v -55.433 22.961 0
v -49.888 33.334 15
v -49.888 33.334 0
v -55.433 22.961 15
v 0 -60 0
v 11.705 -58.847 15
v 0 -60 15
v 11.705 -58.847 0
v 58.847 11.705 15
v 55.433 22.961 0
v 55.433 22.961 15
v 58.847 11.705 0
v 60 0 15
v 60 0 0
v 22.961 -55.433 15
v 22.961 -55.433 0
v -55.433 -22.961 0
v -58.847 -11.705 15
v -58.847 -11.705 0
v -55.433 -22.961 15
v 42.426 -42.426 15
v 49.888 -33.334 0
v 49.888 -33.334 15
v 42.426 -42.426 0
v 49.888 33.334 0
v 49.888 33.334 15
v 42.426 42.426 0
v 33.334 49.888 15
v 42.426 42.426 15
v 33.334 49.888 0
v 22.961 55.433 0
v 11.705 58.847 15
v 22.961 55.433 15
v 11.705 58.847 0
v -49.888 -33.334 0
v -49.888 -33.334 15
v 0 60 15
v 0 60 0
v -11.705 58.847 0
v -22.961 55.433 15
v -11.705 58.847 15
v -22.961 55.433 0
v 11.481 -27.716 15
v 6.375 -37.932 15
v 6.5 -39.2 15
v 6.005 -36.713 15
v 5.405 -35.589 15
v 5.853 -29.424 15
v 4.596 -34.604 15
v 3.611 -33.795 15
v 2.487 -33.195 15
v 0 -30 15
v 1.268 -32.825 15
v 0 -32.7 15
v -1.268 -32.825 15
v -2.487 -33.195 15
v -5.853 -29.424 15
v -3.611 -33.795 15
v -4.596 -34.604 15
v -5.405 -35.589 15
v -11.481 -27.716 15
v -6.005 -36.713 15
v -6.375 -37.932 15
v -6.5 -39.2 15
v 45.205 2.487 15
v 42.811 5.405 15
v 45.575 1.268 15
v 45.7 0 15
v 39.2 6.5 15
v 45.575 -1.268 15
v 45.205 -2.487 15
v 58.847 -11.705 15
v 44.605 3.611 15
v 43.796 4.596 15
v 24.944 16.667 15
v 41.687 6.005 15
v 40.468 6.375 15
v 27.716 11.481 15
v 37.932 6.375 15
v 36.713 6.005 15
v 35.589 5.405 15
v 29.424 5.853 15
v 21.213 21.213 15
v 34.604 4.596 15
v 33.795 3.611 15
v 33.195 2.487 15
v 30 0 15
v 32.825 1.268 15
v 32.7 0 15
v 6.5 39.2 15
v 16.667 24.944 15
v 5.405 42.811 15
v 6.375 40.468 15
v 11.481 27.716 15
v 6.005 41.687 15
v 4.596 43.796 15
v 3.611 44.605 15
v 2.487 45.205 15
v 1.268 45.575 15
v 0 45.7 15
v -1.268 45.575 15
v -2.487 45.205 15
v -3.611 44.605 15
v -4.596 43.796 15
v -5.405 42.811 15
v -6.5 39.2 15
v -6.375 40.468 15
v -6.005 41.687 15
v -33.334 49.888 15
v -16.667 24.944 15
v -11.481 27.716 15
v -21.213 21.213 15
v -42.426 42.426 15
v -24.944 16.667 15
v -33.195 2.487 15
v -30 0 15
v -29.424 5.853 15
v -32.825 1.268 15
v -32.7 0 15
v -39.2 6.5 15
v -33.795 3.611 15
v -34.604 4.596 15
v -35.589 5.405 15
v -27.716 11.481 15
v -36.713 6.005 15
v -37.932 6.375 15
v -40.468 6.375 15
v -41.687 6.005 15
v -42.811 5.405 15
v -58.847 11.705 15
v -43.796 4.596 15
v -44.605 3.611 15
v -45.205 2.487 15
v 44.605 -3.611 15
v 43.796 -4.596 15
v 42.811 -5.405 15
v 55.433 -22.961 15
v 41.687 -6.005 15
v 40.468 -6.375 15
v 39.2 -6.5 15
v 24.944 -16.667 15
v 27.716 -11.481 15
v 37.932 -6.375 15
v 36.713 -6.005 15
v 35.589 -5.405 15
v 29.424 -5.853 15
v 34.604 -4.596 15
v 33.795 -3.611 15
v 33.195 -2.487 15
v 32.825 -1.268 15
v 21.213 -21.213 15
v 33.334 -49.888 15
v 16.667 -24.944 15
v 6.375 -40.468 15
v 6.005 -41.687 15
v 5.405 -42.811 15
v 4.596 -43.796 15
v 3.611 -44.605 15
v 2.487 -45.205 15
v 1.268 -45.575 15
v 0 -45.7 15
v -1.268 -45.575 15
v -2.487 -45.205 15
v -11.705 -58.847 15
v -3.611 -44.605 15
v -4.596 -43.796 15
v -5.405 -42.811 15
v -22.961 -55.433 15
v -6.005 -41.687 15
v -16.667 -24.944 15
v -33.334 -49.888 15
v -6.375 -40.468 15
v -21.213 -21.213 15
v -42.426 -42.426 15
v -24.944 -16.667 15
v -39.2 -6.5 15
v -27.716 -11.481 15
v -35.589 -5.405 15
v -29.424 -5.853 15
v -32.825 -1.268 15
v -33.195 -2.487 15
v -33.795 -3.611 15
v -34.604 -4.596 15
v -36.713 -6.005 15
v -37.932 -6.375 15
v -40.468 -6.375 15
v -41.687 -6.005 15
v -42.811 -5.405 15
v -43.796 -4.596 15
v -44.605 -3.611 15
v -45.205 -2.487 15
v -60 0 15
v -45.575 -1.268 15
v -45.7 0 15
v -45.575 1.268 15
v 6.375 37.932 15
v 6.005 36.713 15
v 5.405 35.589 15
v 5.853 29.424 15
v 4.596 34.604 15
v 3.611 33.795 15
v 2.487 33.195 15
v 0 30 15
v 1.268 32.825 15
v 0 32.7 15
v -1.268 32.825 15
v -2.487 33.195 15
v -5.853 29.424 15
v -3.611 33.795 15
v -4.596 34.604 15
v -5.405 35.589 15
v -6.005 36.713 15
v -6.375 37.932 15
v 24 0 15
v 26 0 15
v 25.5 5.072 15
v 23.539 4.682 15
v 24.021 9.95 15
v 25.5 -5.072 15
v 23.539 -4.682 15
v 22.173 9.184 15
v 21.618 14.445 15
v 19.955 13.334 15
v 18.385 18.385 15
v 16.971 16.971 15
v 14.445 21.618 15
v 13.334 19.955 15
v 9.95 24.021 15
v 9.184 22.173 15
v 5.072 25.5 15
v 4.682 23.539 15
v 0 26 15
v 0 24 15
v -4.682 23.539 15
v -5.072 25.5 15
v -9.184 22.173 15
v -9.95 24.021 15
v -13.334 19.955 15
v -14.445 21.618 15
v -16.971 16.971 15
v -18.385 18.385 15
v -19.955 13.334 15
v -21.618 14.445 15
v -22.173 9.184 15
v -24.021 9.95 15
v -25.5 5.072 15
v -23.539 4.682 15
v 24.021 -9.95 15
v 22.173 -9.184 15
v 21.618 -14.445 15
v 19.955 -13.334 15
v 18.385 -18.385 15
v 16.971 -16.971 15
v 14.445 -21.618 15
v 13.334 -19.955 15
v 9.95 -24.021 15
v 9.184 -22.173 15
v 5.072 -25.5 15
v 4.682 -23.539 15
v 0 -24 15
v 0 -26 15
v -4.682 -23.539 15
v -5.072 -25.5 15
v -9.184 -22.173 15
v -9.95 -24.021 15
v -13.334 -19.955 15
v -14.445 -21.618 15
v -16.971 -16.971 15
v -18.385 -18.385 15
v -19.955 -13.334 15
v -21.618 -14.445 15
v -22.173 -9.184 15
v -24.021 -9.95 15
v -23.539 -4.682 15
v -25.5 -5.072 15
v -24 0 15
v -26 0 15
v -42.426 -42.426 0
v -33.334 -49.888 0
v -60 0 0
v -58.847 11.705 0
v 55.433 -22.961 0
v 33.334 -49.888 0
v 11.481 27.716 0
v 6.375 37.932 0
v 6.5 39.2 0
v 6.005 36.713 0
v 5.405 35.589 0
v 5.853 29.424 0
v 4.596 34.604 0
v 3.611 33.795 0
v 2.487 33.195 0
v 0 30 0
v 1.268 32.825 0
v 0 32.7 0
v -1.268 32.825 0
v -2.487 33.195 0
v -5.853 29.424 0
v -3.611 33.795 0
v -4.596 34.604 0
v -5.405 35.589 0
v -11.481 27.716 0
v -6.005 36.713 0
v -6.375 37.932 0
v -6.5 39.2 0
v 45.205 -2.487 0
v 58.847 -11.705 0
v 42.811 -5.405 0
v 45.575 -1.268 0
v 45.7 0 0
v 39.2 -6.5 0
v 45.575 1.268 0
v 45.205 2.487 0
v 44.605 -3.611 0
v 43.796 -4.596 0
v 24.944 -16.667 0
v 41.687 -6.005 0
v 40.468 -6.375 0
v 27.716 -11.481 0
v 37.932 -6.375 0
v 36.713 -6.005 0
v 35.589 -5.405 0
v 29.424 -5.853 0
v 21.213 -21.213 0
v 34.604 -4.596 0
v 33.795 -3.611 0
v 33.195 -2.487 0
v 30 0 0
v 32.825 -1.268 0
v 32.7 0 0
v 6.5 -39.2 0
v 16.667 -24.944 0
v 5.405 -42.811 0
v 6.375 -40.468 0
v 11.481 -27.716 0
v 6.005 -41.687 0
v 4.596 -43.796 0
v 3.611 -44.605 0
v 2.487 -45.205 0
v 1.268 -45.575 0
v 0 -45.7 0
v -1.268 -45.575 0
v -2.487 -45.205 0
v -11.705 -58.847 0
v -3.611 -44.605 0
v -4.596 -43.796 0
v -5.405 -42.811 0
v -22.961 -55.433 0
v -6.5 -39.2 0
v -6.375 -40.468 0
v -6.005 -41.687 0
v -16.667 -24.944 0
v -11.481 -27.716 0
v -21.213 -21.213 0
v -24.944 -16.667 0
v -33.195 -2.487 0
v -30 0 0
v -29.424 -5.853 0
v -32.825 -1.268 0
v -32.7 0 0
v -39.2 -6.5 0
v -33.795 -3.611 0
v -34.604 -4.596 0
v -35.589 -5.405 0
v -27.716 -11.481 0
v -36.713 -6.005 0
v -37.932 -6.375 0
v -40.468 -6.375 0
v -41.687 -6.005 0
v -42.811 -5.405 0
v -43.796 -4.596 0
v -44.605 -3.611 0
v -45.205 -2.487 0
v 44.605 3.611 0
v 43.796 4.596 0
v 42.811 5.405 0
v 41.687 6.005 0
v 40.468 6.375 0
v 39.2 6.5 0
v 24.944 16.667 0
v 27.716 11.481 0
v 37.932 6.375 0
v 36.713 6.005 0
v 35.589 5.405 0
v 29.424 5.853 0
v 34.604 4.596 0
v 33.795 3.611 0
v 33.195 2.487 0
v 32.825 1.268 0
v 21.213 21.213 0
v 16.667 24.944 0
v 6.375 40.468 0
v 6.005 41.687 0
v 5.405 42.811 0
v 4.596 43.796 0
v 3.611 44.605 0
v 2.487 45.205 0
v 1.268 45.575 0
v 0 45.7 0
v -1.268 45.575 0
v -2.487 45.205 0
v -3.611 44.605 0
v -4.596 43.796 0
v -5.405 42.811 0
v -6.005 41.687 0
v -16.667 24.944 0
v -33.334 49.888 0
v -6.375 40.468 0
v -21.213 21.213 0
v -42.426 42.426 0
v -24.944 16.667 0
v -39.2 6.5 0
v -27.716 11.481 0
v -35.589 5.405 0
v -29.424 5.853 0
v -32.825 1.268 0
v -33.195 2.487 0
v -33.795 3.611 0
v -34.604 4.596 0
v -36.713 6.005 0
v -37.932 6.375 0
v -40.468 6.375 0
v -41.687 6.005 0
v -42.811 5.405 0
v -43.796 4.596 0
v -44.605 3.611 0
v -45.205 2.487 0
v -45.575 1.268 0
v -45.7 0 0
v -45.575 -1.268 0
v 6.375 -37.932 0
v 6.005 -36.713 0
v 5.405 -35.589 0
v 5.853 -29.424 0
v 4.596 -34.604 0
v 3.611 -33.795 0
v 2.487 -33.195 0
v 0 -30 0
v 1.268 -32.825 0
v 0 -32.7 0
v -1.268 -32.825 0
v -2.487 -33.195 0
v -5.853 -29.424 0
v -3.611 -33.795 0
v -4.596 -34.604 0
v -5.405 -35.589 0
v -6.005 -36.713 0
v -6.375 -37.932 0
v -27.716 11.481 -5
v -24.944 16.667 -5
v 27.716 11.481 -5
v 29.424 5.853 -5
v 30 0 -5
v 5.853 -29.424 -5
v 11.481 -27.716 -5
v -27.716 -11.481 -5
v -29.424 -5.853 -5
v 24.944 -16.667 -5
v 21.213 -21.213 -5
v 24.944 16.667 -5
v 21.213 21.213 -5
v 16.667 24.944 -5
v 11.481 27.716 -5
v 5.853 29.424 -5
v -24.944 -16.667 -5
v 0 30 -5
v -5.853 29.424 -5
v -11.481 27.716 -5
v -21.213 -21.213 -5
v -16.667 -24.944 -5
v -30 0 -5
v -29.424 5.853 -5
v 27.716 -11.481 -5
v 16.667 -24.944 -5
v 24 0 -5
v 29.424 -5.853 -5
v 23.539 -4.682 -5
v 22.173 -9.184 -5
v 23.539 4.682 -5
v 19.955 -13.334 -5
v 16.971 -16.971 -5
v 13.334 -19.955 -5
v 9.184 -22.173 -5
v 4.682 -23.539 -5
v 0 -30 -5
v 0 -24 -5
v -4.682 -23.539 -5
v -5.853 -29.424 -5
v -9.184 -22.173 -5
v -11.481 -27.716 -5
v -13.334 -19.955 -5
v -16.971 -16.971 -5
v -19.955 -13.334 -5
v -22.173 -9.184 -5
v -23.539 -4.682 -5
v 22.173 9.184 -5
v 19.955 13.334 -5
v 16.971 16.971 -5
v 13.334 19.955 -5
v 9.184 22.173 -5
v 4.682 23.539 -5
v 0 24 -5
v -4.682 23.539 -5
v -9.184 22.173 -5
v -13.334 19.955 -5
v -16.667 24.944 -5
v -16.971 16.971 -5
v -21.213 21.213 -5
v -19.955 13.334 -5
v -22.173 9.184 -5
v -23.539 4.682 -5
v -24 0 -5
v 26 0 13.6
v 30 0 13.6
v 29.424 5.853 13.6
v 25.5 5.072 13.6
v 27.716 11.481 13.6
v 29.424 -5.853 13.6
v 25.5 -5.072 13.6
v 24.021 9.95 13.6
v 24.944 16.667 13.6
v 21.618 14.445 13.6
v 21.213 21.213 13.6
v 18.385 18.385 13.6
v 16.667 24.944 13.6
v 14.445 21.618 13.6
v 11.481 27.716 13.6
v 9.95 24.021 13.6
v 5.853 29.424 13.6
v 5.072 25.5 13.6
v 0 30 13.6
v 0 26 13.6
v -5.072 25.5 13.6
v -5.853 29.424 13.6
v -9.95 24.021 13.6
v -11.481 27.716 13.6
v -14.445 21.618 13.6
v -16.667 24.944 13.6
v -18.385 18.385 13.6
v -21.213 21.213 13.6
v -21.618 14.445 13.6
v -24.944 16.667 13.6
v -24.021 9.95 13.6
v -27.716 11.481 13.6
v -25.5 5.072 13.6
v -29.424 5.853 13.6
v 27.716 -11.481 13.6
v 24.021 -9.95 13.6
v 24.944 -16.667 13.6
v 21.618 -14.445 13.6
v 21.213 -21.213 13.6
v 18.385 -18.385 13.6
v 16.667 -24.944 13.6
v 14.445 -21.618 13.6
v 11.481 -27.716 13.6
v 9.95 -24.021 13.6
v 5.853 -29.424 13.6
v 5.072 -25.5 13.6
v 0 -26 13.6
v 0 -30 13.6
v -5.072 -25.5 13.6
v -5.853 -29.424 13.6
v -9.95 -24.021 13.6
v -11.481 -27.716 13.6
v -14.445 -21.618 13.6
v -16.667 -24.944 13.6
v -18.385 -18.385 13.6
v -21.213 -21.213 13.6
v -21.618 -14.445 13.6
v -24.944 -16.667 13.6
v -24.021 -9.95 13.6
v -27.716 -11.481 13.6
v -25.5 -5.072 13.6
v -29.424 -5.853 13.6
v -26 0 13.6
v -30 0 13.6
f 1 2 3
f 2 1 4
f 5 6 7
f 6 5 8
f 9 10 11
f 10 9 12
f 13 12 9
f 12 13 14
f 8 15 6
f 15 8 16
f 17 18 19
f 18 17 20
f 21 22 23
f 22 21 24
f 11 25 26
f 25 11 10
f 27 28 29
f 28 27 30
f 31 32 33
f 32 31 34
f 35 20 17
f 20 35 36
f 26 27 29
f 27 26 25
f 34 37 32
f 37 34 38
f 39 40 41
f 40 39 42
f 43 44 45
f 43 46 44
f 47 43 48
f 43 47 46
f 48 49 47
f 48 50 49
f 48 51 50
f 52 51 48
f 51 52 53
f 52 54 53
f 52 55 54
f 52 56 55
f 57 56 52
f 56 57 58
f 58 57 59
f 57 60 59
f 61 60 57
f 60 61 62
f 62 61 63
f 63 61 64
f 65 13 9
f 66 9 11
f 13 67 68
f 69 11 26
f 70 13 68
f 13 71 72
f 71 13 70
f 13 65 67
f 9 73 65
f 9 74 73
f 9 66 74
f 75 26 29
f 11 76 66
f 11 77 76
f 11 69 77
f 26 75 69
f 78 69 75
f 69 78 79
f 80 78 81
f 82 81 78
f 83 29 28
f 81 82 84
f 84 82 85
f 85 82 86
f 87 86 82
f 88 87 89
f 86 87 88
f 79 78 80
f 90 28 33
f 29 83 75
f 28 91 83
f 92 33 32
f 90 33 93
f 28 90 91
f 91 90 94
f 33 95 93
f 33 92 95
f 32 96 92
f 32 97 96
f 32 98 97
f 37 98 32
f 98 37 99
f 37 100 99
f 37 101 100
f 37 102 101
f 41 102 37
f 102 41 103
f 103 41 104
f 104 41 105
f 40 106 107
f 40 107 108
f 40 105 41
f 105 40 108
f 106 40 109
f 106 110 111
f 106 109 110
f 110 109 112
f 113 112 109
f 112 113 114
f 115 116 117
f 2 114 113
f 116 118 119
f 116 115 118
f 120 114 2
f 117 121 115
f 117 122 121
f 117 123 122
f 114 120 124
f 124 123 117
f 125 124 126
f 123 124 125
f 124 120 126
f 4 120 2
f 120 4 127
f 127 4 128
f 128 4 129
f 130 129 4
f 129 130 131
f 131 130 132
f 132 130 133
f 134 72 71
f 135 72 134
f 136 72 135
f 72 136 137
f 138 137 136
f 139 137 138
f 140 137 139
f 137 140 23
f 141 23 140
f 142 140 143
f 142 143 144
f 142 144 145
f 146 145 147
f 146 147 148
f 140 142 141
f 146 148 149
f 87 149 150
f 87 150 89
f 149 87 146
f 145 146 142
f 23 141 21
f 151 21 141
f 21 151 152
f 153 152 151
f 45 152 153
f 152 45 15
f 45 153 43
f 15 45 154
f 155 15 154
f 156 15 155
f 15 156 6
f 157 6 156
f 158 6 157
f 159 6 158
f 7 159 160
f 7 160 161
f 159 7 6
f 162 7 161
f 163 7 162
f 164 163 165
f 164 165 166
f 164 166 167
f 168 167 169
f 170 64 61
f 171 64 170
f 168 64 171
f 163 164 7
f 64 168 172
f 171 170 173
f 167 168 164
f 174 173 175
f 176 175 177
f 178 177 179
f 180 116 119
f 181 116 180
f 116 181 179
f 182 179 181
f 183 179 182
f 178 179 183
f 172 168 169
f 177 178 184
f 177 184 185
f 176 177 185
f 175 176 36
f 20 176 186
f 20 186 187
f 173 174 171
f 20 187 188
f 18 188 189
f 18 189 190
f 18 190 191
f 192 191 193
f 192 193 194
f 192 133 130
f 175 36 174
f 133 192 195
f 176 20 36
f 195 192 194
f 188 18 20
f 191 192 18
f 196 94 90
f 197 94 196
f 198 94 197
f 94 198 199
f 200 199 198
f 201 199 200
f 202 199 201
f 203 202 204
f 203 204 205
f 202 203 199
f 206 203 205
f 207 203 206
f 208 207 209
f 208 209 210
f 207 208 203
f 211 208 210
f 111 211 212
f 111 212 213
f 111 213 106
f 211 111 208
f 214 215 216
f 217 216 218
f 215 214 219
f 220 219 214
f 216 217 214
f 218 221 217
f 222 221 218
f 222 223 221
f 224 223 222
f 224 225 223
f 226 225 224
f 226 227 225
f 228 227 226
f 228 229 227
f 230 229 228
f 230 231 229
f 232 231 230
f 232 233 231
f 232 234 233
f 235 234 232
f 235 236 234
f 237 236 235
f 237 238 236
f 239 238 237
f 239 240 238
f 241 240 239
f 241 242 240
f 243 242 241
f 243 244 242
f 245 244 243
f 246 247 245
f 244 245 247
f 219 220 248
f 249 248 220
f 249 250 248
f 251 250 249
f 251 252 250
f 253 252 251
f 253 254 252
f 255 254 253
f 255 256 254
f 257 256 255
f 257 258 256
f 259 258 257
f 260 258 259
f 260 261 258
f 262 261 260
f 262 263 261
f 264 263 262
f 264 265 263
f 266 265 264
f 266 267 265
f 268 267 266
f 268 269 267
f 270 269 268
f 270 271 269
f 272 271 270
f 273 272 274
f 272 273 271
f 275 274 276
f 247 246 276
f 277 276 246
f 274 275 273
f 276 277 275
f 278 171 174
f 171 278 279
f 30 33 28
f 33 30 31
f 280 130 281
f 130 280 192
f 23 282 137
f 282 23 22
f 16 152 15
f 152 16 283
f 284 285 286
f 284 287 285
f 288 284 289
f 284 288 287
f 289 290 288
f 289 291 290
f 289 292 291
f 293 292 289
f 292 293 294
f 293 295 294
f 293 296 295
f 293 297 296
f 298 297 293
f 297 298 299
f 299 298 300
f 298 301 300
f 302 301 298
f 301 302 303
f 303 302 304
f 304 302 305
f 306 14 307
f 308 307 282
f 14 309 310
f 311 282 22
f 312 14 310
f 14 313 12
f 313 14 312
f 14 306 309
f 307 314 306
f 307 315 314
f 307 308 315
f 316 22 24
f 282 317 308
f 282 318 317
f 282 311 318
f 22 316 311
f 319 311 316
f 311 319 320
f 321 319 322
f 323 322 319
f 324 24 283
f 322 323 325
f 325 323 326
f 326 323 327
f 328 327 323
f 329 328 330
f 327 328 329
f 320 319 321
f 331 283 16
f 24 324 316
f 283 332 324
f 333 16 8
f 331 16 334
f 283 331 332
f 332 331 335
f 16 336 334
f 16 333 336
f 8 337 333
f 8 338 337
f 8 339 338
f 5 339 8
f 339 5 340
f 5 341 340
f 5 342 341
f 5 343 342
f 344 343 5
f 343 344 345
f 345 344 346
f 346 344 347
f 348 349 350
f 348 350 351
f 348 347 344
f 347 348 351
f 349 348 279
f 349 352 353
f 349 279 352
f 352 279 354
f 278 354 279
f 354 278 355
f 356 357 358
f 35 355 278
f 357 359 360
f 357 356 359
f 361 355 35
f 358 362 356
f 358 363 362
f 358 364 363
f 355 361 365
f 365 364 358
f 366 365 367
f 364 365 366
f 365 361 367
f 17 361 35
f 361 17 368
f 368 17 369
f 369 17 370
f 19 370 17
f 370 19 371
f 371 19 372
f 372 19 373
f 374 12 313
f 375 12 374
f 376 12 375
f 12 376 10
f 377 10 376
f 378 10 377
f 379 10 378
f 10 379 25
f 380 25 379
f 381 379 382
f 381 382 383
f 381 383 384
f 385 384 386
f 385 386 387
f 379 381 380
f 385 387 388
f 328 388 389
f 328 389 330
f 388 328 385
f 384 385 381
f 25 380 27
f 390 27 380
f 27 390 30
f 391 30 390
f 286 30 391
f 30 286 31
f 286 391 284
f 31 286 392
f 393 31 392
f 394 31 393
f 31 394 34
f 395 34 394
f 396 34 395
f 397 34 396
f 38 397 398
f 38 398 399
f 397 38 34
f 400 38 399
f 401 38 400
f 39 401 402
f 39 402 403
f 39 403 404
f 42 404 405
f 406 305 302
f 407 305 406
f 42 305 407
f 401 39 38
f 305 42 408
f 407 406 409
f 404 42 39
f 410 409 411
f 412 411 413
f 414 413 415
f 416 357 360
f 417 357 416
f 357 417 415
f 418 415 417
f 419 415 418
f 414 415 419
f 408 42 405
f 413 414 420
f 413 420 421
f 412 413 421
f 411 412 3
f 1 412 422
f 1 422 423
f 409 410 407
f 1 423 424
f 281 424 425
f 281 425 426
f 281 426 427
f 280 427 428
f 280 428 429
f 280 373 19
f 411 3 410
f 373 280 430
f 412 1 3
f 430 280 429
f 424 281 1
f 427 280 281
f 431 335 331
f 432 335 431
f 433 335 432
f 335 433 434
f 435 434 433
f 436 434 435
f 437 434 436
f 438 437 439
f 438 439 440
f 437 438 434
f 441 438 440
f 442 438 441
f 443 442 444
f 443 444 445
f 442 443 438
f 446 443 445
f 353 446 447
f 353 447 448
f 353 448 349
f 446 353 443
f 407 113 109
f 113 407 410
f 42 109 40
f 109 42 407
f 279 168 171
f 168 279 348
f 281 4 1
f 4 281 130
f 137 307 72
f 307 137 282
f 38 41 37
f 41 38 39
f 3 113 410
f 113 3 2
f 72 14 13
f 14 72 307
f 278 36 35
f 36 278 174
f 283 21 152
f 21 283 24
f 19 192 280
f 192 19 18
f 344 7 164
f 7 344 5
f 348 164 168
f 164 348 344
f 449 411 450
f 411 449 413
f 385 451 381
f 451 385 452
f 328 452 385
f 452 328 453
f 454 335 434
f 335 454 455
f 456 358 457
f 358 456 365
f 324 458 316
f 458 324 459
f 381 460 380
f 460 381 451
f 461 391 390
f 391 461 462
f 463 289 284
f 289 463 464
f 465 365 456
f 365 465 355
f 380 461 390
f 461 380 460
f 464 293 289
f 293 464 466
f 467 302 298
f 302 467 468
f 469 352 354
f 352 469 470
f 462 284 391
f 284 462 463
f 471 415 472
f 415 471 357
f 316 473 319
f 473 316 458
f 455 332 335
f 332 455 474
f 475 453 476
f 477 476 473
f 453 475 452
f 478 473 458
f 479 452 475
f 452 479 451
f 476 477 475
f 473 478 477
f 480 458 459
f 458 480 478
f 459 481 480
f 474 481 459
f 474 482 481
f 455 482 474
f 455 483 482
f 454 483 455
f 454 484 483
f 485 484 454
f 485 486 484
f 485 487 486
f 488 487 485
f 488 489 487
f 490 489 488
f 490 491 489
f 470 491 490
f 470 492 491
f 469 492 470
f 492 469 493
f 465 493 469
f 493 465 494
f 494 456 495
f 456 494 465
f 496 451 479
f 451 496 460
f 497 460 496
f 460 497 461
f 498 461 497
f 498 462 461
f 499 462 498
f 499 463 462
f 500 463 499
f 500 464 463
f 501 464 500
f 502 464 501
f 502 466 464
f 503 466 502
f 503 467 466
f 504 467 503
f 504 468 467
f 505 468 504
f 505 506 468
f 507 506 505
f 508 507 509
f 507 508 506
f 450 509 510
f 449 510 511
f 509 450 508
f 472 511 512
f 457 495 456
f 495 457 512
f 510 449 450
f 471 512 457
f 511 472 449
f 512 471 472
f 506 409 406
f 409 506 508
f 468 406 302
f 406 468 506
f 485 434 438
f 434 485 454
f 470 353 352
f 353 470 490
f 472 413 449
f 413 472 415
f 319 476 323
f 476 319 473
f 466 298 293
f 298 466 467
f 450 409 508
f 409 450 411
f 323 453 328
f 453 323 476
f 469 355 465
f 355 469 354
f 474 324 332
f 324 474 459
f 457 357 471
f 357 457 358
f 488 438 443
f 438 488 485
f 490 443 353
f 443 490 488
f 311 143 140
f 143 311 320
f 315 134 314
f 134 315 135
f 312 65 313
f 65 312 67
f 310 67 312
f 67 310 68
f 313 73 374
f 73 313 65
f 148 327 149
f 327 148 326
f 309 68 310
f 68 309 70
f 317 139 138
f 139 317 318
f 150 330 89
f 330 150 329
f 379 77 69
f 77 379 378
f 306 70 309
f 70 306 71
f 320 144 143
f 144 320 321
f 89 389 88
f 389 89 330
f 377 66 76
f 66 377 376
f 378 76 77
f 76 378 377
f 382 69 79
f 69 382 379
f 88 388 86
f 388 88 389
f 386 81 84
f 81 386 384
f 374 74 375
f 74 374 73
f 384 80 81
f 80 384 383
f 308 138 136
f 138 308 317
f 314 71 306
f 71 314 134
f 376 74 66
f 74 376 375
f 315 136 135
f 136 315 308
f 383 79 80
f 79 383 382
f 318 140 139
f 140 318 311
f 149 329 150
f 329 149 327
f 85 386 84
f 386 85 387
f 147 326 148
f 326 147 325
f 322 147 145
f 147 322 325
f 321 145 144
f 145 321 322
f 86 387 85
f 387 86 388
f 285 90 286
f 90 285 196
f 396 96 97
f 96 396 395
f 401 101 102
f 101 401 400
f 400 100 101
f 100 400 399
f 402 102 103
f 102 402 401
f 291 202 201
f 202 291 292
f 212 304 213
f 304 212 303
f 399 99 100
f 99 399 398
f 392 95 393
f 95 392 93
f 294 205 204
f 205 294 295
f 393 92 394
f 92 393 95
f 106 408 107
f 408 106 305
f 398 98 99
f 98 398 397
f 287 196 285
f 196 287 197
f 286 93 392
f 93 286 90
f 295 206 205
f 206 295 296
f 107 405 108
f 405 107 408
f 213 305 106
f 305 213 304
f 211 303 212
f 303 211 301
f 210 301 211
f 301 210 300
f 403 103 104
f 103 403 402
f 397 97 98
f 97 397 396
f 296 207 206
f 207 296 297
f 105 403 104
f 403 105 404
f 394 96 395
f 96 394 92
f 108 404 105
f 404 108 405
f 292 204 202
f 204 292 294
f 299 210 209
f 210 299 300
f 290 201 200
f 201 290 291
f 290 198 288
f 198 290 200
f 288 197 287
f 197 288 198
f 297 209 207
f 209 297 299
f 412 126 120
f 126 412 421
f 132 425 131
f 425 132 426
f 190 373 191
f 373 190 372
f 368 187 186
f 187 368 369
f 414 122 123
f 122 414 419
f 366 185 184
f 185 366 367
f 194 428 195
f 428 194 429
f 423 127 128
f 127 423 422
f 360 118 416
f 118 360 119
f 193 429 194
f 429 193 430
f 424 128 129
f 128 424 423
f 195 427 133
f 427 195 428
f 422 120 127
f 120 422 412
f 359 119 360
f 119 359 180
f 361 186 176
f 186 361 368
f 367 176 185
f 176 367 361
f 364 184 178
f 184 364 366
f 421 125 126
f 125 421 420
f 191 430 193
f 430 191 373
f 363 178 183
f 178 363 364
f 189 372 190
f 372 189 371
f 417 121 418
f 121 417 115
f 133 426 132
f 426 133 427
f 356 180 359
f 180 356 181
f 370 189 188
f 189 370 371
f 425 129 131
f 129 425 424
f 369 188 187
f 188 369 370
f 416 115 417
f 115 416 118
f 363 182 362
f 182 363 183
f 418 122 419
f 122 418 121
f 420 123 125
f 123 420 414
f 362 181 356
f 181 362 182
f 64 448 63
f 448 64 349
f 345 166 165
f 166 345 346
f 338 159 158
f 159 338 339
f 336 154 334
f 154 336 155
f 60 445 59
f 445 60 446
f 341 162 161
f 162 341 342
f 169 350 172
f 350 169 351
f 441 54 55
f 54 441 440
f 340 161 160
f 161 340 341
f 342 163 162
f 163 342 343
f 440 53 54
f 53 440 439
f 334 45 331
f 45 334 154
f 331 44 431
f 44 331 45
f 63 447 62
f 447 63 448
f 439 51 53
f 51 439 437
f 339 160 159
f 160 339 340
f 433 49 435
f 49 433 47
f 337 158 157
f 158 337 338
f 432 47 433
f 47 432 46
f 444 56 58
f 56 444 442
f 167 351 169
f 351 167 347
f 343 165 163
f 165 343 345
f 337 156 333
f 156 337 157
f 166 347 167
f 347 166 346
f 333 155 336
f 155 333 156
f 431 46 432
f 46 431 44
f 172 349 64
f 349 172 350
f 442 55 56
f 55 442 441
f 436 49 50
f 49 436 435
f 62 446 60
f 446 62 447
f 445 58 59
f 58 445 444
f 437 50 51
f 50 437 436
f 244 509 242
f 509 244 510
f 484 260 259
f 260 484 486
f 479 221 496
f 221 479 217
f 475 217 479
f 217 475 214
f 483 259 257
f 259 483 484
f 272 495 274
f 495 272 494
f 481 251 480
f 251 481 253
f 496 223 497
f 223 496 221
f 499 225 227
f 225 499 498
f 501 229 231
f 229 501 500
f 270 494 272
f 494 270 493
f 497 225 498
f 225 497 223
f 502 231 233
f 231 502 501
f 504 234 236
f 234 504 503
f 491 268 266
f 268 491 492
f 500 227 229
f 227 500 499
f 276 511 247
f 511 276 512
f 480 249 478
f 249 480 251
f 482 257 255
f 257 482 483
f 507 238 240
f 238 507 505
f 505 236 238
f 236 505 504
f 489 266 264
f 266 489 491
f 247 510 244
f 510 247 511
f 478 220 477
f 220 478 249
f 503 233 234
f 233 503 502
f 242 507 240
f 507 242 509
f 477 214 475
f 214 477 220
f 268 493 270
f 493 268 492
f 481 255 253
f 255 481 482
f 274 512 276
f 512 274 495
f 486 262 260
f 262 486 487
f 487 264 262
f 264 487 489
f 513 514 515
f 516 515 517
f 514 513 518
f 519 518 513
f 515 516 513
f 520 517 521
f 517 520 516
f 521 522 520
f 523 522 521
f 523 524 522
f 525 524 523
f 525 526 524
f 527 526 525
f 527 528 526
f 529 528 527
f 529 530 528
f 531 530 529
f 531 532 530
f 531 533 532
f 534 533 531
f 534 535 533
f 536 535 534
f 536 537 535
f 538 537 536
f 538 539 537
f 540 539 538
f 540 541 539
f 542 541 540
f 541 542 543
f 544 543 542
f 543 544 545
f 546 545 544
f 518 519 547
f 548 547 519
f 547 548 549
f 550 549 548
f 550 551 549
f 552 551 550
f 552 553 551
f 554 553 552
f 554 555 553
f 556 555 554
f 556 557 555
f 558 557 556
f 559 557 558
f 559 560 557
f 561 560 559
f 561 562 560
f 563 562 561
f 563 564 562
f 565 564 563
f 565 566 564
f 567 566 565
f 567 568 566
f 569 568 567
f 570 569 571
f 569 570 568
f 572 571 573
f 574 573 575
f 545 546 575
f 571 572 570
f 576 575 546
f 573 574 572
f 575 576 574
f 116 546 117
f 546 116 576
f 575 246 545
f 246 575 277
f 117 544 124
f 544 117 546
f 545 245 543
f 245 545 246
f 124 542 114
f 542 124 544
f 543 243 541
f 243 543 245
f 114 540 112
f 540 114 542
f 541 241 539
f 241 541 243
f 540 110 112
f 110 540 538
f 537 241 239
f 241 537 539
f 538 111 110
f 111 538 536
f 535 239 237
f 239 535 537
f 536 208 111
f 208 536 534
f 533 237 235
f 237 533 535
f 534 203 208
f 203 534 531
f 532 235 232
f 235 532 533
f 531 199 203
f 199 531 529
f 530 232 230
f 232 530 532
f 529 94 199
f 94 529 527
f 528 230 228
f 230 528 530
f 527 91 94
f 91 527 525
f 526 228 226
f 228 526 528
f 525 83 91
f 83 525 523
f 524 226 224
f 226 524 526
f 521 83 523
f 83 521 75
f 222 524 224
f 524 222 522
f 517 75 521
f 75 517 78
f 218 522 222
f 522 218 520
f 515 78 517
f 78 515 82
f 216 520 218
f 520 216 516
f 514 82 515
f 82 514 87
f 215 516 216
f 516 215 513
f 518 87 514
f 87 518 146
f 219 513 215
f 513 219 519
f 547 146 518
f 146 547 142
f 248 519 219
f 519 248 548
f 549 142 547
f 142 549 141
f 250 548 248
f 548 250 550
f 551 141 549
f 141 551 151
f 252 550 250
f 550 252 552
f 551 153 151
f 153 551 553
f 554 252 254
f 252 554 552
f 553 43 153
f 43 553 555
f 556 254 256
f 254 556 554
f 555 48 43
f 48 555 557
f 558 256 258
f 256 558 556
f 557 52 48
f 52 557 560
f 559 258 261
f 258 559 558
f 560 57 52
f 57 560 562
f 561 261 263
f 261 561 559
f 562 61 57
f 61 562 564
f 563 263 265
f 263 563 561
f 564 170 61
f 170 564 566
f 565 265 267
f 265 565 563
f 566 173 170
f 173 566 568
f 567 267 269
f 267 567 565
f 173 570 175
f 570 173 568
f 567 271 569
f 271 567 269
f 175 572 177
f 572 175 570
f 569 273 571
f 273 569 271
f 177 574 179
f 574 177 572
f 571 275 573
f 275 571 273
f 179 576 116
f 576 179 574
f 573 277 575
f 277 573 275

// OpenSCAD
$fn = 32;

// ----------------------------------------------------------------------
// Bolt-circle flange: 120 mm outside, 4 bolt holes, bore 48 mm
// ----------------------------------------------------------------------

// --- parameters (mm) ---
flange_d = 120;           // flange outside diameter
flange_t = 15;            // flange thickness
bolts = 4;                // number of bolt holes
bolt_d = 13;              // bolt clearance
bolt_r = 39.2;            // bolt circle radius
bore_d = 48;              // centre bore
spigot_d = 60;            // spigot diameter
spigot_h = 6;             // spigot height below the flange
sink = 1;                 // overlap into the flange
groove_w = 4;             // gasket groove width
groove_d = 1.4;           // gasket groove depth
groove_r = 26;            // groove radius
groove_z = 13.6;          // groove floor depth from the face

module body() {
  cylinder(h = flange_t, d = flange_d);
  /* spigot on the back face, sunk into the flange */
  translate([0, 0, -spigot_h + sink]) cylinder(h = spigot_h, d = spigot_d);
}

difference() {
  body();
  /* bolt circle */
  for (i = [0 : bolts - 1]) rotate([0, 0, i * 360 / bolts]) translate([bolt_r, 0, -spigot_h - 1]) cylinder(h = flange_t + spigot_h + 3, d = bolt_d);
  translate([0, 0, -spigot_h - 1]) cylinder(h = flange_t + spigot_h + 3, d = bore_d);
  /* gasket groove on the front face */
  rotate_extrude() translate([groove_r, groove_z]) square([groove_w, groove_d + 1]);
}
